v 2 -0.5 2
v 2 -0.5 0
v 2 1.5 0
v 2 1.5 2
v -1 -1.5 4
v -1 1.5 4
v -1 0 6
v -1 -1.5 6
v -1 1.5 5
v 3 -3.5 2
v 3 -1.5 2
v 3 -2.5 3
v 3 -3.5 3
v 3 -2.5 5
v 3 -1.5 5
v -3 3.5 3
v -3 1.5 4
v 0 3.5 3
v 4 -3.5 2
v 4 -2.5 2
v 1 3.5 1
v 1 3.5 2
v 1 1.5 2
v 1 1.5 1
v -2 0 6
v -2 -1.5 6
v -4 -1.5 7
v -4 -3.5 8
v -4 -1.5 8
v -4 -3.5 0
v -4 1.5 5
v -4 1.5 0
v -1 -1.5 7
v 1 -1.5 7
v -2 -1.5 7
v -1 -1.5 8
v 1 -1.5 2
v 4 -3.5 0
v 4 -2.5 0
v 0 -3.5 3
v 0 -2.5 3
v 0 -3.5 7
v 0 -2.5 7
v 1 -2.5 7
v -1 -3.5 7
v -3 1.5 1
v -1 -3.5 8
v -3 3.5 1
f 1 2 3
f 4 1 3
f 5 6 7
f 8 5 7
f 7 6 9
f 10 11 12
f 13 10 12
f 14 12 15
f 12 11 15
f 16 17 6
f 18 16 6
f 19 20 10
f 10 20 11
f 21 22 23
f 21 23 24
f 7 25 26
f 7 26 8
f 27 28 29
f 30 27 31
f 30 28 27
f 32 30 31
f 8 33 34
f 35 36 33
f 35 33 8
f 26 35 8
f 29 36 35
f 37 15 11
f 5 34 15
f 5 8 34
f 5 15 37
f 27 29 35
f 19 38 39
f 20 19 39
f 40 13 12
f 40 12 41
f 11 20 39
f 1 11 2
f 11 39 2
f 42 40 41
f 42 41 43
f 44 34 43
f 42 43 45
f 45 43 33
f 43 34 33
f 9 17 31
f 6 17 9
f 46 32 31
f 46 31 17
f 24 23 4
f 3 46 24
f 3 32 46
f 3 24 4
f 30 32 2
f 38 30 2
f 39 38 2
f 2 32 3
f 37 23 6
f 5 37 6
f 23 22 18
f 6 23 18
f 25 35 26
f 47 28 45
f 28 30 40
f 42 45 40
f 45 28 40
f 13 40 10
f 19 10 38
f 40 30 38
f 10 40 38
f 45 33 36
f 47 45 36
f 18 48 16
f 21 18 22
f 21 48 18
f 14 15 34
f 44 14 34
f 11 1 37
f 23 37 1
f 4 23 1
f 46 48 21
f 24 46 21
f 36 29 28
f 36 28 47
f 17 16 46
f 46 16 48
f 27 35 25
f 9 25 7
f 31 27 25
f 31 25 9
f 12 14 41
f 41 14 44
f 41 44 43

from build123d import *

# Parameters (mm, degrees)
SKETCH1_W           = 8
SKETCH1_H           = 7
BOSS_EXTRUDE3_DEPTH = 8
CUT_EXTRUDE1_DEPTH  = 8
CUT_EXTRUDE2_DEPTH  = 1
CUT_EXTRUDE4_DEPTH  = 2
CUT_EXTRUDE5_DEPTH  = 9
SKETCH7_OUTSIDE_W   = 12.66
SKETCH7_OUTSIDE_H   = 12.66
SKETCH7_OUTSIDE_W_2 = 4
SKETCH7_OUTSIDE_H_2 = 3
CUT_EXTRUDE6_DEPTH  = 2
SKETCH8_W           = 1
SKETCH8_H           = 1
CUT_EXTRUDE7_DEPTH  = 3
CUT_EXTRUDE8_DEPTH  = 5
SKETCH11_W          = 4
SKETCH11_H          = 2.236067977
CUT_EXTRUDE9_DEPTH  = 5
CUT_EXTRUDE10_DEPTH = 5
SKETCH13_W          = 2
SKETCH13_H          = 2
CUT_EXTRUDE12_DEPTH = 3


with BuildPart() as part:
    # Sketch1 → Boss-Extrude3 (new body)
    with BuildSketch(Plane.XY):
        Rectangle(SKETCH1_W, SKETCH1_H)
    extrude(amount=BOSS_EXTRUDE3_DEPTH)

    # Sketch3 → Cut-Extrude1 (cut, through all)
    with BuildSketch(Plane(origin=(0, 3.5, 0), x_dir=(1, 0, 0), z_dir=(0, 1, 0))):
        Polygon((4, -8), (4, -2), (3, -2), (3, -5), (1, -7), (-1, -7), (-1, -8), align=None)
    extrude(amount=-CUT_EXTRUDE1_DEPTH, mode=Mode.SUBTRACT)

    # Sketch4 → Cut-Extrude2 (cut)
    with BuildSketch(Plane.XZ.offset(3.5)):
        Polygon((1, 7), (3, 5), (3, 3), (0, 3), (0, 7), align=None)
    extrude(amount=-CUT_EXTRUDE2_DEPTH, mode=Mode.SUBTRACT)

    # Sketch5 → Cut-Extrude4 (cut)
    with BuildSketch(Plane(origin=(0, 0, 0), x_dir=(-1, 0, 0), z_dir=(0, 0, -1))):
        Polygon((-2, -0.5), (-2, 1.5), (-2, 3.5), (-4, 3.5), (-4, 1.5), (-4, -2.5), align=None)
    extrude(amount=-CUT_EXTRUDE4_DEPTH, mode=Mode.SUBTRACT)

    # Sketch6 → Cut-Extrude5 (cut, through all)
    with BuildSketch(Plane.ZY.offset(4)):
        Polygon((8, -1.5), (7, -1.5), (5, 1.5), (5, 3.5), (8, 3.5), align=None)
    extrude(amount=-CUT_EXTRUDE5_DEPTH, mode=Mode.SUBTRACT)

    # Sketch7 outside → Cut-Extrude6 (cut)
    with BuildSketch(Plane(origin=(0, 3.5, 0), x_dir=(1, 0, 0), z_dir=(0, 1, 0))):
        with Locations((0, -4)):
            Rectangle(SKETCH7_OUTSIDE_W, SKETCH7_OUTSIDE_H)
        with Locations((-1, -2.5)):
            Rectangle(SKETCH7_OUTSIDE_W_2, SKETCH7_OUTSIDE_H_2, mode=Mode.SUBTRACT)
    extrude(amount=-CUT_EXTRUDE6_DEPTH, mode=Mode.SUBTRACT)

    # Sketch8 → Cut-Extrude7 (cut)
    with BuildSketch(Plane(origin=(0, 1.5, 0), x_dir=(1, 0, 0), z_dir=(0, 1, 0))):
        with Locations((-1.5, -6.5)):
            Rectangle(SKETCH8_W, SKETCH8_H)
    extrude(amount=-CUT_EXTRUDE7_DEPTH, mode=Mode.SUBTRACT)

    # Sketch9 → Cut-Extrude8 (cut)
    with BuildSketch(Plane(origin=(0, 3.5, 0), x_dir=(1, 0, 0), z_dir=(0, 1, 0))):
        Polygon((-1, -6), (-1, -4), (3, -4), (3, -7), (-1, -7), align=None)
    extrude(amount=-CUT_EXTRUDE8_DEPTH, mode=Mode.SUBTRACT)

    # Sketch11 → Cut-Extrude9 (cut)
    with BuildSketch(Plane(origin=(0, 1.9, 3.8), x_dir=(1, 0, 0), z_dir=(0, 0.447213595, 0.894427191))):
        with Locations((-1, 0.670820394)):
            Rectangle(SKETCH11_W, SKETCH11_H)
    extrude(amount=CUT_EXTRUDE9_DEPTH, mode=Mode.SUBTRACT)

    # Sketch12 → Cut-Extrude10 (cut)
    with BuildSketch(Plane(origin=(0, 3.5, 0), x_dir=(1, 0, 0), z_dir=(0, 1, 0))):
        Polygon((1, -2), (-1, -4), (1, -4), align=None)
    extrude(amount=-CUT_EXTRUDE10_DEPTH, mode=Mode.SUBTRACT)

    # Sketch13 → Cut-Extrude12 (cut)
    with BuildSketch(Plane(origin=(0, 1.5, 0), x_dir=(1, 0, 0), z_dir=(0, 1, 0))):
        with Locations((2, -3)):
            Rectangle(SKETCH13_W, SKETCH13_H)
    extrude(amount=-CUT_EXTRUDE12_DEPTH, mode=Mode.SUBTRACT)


solid = part.part
